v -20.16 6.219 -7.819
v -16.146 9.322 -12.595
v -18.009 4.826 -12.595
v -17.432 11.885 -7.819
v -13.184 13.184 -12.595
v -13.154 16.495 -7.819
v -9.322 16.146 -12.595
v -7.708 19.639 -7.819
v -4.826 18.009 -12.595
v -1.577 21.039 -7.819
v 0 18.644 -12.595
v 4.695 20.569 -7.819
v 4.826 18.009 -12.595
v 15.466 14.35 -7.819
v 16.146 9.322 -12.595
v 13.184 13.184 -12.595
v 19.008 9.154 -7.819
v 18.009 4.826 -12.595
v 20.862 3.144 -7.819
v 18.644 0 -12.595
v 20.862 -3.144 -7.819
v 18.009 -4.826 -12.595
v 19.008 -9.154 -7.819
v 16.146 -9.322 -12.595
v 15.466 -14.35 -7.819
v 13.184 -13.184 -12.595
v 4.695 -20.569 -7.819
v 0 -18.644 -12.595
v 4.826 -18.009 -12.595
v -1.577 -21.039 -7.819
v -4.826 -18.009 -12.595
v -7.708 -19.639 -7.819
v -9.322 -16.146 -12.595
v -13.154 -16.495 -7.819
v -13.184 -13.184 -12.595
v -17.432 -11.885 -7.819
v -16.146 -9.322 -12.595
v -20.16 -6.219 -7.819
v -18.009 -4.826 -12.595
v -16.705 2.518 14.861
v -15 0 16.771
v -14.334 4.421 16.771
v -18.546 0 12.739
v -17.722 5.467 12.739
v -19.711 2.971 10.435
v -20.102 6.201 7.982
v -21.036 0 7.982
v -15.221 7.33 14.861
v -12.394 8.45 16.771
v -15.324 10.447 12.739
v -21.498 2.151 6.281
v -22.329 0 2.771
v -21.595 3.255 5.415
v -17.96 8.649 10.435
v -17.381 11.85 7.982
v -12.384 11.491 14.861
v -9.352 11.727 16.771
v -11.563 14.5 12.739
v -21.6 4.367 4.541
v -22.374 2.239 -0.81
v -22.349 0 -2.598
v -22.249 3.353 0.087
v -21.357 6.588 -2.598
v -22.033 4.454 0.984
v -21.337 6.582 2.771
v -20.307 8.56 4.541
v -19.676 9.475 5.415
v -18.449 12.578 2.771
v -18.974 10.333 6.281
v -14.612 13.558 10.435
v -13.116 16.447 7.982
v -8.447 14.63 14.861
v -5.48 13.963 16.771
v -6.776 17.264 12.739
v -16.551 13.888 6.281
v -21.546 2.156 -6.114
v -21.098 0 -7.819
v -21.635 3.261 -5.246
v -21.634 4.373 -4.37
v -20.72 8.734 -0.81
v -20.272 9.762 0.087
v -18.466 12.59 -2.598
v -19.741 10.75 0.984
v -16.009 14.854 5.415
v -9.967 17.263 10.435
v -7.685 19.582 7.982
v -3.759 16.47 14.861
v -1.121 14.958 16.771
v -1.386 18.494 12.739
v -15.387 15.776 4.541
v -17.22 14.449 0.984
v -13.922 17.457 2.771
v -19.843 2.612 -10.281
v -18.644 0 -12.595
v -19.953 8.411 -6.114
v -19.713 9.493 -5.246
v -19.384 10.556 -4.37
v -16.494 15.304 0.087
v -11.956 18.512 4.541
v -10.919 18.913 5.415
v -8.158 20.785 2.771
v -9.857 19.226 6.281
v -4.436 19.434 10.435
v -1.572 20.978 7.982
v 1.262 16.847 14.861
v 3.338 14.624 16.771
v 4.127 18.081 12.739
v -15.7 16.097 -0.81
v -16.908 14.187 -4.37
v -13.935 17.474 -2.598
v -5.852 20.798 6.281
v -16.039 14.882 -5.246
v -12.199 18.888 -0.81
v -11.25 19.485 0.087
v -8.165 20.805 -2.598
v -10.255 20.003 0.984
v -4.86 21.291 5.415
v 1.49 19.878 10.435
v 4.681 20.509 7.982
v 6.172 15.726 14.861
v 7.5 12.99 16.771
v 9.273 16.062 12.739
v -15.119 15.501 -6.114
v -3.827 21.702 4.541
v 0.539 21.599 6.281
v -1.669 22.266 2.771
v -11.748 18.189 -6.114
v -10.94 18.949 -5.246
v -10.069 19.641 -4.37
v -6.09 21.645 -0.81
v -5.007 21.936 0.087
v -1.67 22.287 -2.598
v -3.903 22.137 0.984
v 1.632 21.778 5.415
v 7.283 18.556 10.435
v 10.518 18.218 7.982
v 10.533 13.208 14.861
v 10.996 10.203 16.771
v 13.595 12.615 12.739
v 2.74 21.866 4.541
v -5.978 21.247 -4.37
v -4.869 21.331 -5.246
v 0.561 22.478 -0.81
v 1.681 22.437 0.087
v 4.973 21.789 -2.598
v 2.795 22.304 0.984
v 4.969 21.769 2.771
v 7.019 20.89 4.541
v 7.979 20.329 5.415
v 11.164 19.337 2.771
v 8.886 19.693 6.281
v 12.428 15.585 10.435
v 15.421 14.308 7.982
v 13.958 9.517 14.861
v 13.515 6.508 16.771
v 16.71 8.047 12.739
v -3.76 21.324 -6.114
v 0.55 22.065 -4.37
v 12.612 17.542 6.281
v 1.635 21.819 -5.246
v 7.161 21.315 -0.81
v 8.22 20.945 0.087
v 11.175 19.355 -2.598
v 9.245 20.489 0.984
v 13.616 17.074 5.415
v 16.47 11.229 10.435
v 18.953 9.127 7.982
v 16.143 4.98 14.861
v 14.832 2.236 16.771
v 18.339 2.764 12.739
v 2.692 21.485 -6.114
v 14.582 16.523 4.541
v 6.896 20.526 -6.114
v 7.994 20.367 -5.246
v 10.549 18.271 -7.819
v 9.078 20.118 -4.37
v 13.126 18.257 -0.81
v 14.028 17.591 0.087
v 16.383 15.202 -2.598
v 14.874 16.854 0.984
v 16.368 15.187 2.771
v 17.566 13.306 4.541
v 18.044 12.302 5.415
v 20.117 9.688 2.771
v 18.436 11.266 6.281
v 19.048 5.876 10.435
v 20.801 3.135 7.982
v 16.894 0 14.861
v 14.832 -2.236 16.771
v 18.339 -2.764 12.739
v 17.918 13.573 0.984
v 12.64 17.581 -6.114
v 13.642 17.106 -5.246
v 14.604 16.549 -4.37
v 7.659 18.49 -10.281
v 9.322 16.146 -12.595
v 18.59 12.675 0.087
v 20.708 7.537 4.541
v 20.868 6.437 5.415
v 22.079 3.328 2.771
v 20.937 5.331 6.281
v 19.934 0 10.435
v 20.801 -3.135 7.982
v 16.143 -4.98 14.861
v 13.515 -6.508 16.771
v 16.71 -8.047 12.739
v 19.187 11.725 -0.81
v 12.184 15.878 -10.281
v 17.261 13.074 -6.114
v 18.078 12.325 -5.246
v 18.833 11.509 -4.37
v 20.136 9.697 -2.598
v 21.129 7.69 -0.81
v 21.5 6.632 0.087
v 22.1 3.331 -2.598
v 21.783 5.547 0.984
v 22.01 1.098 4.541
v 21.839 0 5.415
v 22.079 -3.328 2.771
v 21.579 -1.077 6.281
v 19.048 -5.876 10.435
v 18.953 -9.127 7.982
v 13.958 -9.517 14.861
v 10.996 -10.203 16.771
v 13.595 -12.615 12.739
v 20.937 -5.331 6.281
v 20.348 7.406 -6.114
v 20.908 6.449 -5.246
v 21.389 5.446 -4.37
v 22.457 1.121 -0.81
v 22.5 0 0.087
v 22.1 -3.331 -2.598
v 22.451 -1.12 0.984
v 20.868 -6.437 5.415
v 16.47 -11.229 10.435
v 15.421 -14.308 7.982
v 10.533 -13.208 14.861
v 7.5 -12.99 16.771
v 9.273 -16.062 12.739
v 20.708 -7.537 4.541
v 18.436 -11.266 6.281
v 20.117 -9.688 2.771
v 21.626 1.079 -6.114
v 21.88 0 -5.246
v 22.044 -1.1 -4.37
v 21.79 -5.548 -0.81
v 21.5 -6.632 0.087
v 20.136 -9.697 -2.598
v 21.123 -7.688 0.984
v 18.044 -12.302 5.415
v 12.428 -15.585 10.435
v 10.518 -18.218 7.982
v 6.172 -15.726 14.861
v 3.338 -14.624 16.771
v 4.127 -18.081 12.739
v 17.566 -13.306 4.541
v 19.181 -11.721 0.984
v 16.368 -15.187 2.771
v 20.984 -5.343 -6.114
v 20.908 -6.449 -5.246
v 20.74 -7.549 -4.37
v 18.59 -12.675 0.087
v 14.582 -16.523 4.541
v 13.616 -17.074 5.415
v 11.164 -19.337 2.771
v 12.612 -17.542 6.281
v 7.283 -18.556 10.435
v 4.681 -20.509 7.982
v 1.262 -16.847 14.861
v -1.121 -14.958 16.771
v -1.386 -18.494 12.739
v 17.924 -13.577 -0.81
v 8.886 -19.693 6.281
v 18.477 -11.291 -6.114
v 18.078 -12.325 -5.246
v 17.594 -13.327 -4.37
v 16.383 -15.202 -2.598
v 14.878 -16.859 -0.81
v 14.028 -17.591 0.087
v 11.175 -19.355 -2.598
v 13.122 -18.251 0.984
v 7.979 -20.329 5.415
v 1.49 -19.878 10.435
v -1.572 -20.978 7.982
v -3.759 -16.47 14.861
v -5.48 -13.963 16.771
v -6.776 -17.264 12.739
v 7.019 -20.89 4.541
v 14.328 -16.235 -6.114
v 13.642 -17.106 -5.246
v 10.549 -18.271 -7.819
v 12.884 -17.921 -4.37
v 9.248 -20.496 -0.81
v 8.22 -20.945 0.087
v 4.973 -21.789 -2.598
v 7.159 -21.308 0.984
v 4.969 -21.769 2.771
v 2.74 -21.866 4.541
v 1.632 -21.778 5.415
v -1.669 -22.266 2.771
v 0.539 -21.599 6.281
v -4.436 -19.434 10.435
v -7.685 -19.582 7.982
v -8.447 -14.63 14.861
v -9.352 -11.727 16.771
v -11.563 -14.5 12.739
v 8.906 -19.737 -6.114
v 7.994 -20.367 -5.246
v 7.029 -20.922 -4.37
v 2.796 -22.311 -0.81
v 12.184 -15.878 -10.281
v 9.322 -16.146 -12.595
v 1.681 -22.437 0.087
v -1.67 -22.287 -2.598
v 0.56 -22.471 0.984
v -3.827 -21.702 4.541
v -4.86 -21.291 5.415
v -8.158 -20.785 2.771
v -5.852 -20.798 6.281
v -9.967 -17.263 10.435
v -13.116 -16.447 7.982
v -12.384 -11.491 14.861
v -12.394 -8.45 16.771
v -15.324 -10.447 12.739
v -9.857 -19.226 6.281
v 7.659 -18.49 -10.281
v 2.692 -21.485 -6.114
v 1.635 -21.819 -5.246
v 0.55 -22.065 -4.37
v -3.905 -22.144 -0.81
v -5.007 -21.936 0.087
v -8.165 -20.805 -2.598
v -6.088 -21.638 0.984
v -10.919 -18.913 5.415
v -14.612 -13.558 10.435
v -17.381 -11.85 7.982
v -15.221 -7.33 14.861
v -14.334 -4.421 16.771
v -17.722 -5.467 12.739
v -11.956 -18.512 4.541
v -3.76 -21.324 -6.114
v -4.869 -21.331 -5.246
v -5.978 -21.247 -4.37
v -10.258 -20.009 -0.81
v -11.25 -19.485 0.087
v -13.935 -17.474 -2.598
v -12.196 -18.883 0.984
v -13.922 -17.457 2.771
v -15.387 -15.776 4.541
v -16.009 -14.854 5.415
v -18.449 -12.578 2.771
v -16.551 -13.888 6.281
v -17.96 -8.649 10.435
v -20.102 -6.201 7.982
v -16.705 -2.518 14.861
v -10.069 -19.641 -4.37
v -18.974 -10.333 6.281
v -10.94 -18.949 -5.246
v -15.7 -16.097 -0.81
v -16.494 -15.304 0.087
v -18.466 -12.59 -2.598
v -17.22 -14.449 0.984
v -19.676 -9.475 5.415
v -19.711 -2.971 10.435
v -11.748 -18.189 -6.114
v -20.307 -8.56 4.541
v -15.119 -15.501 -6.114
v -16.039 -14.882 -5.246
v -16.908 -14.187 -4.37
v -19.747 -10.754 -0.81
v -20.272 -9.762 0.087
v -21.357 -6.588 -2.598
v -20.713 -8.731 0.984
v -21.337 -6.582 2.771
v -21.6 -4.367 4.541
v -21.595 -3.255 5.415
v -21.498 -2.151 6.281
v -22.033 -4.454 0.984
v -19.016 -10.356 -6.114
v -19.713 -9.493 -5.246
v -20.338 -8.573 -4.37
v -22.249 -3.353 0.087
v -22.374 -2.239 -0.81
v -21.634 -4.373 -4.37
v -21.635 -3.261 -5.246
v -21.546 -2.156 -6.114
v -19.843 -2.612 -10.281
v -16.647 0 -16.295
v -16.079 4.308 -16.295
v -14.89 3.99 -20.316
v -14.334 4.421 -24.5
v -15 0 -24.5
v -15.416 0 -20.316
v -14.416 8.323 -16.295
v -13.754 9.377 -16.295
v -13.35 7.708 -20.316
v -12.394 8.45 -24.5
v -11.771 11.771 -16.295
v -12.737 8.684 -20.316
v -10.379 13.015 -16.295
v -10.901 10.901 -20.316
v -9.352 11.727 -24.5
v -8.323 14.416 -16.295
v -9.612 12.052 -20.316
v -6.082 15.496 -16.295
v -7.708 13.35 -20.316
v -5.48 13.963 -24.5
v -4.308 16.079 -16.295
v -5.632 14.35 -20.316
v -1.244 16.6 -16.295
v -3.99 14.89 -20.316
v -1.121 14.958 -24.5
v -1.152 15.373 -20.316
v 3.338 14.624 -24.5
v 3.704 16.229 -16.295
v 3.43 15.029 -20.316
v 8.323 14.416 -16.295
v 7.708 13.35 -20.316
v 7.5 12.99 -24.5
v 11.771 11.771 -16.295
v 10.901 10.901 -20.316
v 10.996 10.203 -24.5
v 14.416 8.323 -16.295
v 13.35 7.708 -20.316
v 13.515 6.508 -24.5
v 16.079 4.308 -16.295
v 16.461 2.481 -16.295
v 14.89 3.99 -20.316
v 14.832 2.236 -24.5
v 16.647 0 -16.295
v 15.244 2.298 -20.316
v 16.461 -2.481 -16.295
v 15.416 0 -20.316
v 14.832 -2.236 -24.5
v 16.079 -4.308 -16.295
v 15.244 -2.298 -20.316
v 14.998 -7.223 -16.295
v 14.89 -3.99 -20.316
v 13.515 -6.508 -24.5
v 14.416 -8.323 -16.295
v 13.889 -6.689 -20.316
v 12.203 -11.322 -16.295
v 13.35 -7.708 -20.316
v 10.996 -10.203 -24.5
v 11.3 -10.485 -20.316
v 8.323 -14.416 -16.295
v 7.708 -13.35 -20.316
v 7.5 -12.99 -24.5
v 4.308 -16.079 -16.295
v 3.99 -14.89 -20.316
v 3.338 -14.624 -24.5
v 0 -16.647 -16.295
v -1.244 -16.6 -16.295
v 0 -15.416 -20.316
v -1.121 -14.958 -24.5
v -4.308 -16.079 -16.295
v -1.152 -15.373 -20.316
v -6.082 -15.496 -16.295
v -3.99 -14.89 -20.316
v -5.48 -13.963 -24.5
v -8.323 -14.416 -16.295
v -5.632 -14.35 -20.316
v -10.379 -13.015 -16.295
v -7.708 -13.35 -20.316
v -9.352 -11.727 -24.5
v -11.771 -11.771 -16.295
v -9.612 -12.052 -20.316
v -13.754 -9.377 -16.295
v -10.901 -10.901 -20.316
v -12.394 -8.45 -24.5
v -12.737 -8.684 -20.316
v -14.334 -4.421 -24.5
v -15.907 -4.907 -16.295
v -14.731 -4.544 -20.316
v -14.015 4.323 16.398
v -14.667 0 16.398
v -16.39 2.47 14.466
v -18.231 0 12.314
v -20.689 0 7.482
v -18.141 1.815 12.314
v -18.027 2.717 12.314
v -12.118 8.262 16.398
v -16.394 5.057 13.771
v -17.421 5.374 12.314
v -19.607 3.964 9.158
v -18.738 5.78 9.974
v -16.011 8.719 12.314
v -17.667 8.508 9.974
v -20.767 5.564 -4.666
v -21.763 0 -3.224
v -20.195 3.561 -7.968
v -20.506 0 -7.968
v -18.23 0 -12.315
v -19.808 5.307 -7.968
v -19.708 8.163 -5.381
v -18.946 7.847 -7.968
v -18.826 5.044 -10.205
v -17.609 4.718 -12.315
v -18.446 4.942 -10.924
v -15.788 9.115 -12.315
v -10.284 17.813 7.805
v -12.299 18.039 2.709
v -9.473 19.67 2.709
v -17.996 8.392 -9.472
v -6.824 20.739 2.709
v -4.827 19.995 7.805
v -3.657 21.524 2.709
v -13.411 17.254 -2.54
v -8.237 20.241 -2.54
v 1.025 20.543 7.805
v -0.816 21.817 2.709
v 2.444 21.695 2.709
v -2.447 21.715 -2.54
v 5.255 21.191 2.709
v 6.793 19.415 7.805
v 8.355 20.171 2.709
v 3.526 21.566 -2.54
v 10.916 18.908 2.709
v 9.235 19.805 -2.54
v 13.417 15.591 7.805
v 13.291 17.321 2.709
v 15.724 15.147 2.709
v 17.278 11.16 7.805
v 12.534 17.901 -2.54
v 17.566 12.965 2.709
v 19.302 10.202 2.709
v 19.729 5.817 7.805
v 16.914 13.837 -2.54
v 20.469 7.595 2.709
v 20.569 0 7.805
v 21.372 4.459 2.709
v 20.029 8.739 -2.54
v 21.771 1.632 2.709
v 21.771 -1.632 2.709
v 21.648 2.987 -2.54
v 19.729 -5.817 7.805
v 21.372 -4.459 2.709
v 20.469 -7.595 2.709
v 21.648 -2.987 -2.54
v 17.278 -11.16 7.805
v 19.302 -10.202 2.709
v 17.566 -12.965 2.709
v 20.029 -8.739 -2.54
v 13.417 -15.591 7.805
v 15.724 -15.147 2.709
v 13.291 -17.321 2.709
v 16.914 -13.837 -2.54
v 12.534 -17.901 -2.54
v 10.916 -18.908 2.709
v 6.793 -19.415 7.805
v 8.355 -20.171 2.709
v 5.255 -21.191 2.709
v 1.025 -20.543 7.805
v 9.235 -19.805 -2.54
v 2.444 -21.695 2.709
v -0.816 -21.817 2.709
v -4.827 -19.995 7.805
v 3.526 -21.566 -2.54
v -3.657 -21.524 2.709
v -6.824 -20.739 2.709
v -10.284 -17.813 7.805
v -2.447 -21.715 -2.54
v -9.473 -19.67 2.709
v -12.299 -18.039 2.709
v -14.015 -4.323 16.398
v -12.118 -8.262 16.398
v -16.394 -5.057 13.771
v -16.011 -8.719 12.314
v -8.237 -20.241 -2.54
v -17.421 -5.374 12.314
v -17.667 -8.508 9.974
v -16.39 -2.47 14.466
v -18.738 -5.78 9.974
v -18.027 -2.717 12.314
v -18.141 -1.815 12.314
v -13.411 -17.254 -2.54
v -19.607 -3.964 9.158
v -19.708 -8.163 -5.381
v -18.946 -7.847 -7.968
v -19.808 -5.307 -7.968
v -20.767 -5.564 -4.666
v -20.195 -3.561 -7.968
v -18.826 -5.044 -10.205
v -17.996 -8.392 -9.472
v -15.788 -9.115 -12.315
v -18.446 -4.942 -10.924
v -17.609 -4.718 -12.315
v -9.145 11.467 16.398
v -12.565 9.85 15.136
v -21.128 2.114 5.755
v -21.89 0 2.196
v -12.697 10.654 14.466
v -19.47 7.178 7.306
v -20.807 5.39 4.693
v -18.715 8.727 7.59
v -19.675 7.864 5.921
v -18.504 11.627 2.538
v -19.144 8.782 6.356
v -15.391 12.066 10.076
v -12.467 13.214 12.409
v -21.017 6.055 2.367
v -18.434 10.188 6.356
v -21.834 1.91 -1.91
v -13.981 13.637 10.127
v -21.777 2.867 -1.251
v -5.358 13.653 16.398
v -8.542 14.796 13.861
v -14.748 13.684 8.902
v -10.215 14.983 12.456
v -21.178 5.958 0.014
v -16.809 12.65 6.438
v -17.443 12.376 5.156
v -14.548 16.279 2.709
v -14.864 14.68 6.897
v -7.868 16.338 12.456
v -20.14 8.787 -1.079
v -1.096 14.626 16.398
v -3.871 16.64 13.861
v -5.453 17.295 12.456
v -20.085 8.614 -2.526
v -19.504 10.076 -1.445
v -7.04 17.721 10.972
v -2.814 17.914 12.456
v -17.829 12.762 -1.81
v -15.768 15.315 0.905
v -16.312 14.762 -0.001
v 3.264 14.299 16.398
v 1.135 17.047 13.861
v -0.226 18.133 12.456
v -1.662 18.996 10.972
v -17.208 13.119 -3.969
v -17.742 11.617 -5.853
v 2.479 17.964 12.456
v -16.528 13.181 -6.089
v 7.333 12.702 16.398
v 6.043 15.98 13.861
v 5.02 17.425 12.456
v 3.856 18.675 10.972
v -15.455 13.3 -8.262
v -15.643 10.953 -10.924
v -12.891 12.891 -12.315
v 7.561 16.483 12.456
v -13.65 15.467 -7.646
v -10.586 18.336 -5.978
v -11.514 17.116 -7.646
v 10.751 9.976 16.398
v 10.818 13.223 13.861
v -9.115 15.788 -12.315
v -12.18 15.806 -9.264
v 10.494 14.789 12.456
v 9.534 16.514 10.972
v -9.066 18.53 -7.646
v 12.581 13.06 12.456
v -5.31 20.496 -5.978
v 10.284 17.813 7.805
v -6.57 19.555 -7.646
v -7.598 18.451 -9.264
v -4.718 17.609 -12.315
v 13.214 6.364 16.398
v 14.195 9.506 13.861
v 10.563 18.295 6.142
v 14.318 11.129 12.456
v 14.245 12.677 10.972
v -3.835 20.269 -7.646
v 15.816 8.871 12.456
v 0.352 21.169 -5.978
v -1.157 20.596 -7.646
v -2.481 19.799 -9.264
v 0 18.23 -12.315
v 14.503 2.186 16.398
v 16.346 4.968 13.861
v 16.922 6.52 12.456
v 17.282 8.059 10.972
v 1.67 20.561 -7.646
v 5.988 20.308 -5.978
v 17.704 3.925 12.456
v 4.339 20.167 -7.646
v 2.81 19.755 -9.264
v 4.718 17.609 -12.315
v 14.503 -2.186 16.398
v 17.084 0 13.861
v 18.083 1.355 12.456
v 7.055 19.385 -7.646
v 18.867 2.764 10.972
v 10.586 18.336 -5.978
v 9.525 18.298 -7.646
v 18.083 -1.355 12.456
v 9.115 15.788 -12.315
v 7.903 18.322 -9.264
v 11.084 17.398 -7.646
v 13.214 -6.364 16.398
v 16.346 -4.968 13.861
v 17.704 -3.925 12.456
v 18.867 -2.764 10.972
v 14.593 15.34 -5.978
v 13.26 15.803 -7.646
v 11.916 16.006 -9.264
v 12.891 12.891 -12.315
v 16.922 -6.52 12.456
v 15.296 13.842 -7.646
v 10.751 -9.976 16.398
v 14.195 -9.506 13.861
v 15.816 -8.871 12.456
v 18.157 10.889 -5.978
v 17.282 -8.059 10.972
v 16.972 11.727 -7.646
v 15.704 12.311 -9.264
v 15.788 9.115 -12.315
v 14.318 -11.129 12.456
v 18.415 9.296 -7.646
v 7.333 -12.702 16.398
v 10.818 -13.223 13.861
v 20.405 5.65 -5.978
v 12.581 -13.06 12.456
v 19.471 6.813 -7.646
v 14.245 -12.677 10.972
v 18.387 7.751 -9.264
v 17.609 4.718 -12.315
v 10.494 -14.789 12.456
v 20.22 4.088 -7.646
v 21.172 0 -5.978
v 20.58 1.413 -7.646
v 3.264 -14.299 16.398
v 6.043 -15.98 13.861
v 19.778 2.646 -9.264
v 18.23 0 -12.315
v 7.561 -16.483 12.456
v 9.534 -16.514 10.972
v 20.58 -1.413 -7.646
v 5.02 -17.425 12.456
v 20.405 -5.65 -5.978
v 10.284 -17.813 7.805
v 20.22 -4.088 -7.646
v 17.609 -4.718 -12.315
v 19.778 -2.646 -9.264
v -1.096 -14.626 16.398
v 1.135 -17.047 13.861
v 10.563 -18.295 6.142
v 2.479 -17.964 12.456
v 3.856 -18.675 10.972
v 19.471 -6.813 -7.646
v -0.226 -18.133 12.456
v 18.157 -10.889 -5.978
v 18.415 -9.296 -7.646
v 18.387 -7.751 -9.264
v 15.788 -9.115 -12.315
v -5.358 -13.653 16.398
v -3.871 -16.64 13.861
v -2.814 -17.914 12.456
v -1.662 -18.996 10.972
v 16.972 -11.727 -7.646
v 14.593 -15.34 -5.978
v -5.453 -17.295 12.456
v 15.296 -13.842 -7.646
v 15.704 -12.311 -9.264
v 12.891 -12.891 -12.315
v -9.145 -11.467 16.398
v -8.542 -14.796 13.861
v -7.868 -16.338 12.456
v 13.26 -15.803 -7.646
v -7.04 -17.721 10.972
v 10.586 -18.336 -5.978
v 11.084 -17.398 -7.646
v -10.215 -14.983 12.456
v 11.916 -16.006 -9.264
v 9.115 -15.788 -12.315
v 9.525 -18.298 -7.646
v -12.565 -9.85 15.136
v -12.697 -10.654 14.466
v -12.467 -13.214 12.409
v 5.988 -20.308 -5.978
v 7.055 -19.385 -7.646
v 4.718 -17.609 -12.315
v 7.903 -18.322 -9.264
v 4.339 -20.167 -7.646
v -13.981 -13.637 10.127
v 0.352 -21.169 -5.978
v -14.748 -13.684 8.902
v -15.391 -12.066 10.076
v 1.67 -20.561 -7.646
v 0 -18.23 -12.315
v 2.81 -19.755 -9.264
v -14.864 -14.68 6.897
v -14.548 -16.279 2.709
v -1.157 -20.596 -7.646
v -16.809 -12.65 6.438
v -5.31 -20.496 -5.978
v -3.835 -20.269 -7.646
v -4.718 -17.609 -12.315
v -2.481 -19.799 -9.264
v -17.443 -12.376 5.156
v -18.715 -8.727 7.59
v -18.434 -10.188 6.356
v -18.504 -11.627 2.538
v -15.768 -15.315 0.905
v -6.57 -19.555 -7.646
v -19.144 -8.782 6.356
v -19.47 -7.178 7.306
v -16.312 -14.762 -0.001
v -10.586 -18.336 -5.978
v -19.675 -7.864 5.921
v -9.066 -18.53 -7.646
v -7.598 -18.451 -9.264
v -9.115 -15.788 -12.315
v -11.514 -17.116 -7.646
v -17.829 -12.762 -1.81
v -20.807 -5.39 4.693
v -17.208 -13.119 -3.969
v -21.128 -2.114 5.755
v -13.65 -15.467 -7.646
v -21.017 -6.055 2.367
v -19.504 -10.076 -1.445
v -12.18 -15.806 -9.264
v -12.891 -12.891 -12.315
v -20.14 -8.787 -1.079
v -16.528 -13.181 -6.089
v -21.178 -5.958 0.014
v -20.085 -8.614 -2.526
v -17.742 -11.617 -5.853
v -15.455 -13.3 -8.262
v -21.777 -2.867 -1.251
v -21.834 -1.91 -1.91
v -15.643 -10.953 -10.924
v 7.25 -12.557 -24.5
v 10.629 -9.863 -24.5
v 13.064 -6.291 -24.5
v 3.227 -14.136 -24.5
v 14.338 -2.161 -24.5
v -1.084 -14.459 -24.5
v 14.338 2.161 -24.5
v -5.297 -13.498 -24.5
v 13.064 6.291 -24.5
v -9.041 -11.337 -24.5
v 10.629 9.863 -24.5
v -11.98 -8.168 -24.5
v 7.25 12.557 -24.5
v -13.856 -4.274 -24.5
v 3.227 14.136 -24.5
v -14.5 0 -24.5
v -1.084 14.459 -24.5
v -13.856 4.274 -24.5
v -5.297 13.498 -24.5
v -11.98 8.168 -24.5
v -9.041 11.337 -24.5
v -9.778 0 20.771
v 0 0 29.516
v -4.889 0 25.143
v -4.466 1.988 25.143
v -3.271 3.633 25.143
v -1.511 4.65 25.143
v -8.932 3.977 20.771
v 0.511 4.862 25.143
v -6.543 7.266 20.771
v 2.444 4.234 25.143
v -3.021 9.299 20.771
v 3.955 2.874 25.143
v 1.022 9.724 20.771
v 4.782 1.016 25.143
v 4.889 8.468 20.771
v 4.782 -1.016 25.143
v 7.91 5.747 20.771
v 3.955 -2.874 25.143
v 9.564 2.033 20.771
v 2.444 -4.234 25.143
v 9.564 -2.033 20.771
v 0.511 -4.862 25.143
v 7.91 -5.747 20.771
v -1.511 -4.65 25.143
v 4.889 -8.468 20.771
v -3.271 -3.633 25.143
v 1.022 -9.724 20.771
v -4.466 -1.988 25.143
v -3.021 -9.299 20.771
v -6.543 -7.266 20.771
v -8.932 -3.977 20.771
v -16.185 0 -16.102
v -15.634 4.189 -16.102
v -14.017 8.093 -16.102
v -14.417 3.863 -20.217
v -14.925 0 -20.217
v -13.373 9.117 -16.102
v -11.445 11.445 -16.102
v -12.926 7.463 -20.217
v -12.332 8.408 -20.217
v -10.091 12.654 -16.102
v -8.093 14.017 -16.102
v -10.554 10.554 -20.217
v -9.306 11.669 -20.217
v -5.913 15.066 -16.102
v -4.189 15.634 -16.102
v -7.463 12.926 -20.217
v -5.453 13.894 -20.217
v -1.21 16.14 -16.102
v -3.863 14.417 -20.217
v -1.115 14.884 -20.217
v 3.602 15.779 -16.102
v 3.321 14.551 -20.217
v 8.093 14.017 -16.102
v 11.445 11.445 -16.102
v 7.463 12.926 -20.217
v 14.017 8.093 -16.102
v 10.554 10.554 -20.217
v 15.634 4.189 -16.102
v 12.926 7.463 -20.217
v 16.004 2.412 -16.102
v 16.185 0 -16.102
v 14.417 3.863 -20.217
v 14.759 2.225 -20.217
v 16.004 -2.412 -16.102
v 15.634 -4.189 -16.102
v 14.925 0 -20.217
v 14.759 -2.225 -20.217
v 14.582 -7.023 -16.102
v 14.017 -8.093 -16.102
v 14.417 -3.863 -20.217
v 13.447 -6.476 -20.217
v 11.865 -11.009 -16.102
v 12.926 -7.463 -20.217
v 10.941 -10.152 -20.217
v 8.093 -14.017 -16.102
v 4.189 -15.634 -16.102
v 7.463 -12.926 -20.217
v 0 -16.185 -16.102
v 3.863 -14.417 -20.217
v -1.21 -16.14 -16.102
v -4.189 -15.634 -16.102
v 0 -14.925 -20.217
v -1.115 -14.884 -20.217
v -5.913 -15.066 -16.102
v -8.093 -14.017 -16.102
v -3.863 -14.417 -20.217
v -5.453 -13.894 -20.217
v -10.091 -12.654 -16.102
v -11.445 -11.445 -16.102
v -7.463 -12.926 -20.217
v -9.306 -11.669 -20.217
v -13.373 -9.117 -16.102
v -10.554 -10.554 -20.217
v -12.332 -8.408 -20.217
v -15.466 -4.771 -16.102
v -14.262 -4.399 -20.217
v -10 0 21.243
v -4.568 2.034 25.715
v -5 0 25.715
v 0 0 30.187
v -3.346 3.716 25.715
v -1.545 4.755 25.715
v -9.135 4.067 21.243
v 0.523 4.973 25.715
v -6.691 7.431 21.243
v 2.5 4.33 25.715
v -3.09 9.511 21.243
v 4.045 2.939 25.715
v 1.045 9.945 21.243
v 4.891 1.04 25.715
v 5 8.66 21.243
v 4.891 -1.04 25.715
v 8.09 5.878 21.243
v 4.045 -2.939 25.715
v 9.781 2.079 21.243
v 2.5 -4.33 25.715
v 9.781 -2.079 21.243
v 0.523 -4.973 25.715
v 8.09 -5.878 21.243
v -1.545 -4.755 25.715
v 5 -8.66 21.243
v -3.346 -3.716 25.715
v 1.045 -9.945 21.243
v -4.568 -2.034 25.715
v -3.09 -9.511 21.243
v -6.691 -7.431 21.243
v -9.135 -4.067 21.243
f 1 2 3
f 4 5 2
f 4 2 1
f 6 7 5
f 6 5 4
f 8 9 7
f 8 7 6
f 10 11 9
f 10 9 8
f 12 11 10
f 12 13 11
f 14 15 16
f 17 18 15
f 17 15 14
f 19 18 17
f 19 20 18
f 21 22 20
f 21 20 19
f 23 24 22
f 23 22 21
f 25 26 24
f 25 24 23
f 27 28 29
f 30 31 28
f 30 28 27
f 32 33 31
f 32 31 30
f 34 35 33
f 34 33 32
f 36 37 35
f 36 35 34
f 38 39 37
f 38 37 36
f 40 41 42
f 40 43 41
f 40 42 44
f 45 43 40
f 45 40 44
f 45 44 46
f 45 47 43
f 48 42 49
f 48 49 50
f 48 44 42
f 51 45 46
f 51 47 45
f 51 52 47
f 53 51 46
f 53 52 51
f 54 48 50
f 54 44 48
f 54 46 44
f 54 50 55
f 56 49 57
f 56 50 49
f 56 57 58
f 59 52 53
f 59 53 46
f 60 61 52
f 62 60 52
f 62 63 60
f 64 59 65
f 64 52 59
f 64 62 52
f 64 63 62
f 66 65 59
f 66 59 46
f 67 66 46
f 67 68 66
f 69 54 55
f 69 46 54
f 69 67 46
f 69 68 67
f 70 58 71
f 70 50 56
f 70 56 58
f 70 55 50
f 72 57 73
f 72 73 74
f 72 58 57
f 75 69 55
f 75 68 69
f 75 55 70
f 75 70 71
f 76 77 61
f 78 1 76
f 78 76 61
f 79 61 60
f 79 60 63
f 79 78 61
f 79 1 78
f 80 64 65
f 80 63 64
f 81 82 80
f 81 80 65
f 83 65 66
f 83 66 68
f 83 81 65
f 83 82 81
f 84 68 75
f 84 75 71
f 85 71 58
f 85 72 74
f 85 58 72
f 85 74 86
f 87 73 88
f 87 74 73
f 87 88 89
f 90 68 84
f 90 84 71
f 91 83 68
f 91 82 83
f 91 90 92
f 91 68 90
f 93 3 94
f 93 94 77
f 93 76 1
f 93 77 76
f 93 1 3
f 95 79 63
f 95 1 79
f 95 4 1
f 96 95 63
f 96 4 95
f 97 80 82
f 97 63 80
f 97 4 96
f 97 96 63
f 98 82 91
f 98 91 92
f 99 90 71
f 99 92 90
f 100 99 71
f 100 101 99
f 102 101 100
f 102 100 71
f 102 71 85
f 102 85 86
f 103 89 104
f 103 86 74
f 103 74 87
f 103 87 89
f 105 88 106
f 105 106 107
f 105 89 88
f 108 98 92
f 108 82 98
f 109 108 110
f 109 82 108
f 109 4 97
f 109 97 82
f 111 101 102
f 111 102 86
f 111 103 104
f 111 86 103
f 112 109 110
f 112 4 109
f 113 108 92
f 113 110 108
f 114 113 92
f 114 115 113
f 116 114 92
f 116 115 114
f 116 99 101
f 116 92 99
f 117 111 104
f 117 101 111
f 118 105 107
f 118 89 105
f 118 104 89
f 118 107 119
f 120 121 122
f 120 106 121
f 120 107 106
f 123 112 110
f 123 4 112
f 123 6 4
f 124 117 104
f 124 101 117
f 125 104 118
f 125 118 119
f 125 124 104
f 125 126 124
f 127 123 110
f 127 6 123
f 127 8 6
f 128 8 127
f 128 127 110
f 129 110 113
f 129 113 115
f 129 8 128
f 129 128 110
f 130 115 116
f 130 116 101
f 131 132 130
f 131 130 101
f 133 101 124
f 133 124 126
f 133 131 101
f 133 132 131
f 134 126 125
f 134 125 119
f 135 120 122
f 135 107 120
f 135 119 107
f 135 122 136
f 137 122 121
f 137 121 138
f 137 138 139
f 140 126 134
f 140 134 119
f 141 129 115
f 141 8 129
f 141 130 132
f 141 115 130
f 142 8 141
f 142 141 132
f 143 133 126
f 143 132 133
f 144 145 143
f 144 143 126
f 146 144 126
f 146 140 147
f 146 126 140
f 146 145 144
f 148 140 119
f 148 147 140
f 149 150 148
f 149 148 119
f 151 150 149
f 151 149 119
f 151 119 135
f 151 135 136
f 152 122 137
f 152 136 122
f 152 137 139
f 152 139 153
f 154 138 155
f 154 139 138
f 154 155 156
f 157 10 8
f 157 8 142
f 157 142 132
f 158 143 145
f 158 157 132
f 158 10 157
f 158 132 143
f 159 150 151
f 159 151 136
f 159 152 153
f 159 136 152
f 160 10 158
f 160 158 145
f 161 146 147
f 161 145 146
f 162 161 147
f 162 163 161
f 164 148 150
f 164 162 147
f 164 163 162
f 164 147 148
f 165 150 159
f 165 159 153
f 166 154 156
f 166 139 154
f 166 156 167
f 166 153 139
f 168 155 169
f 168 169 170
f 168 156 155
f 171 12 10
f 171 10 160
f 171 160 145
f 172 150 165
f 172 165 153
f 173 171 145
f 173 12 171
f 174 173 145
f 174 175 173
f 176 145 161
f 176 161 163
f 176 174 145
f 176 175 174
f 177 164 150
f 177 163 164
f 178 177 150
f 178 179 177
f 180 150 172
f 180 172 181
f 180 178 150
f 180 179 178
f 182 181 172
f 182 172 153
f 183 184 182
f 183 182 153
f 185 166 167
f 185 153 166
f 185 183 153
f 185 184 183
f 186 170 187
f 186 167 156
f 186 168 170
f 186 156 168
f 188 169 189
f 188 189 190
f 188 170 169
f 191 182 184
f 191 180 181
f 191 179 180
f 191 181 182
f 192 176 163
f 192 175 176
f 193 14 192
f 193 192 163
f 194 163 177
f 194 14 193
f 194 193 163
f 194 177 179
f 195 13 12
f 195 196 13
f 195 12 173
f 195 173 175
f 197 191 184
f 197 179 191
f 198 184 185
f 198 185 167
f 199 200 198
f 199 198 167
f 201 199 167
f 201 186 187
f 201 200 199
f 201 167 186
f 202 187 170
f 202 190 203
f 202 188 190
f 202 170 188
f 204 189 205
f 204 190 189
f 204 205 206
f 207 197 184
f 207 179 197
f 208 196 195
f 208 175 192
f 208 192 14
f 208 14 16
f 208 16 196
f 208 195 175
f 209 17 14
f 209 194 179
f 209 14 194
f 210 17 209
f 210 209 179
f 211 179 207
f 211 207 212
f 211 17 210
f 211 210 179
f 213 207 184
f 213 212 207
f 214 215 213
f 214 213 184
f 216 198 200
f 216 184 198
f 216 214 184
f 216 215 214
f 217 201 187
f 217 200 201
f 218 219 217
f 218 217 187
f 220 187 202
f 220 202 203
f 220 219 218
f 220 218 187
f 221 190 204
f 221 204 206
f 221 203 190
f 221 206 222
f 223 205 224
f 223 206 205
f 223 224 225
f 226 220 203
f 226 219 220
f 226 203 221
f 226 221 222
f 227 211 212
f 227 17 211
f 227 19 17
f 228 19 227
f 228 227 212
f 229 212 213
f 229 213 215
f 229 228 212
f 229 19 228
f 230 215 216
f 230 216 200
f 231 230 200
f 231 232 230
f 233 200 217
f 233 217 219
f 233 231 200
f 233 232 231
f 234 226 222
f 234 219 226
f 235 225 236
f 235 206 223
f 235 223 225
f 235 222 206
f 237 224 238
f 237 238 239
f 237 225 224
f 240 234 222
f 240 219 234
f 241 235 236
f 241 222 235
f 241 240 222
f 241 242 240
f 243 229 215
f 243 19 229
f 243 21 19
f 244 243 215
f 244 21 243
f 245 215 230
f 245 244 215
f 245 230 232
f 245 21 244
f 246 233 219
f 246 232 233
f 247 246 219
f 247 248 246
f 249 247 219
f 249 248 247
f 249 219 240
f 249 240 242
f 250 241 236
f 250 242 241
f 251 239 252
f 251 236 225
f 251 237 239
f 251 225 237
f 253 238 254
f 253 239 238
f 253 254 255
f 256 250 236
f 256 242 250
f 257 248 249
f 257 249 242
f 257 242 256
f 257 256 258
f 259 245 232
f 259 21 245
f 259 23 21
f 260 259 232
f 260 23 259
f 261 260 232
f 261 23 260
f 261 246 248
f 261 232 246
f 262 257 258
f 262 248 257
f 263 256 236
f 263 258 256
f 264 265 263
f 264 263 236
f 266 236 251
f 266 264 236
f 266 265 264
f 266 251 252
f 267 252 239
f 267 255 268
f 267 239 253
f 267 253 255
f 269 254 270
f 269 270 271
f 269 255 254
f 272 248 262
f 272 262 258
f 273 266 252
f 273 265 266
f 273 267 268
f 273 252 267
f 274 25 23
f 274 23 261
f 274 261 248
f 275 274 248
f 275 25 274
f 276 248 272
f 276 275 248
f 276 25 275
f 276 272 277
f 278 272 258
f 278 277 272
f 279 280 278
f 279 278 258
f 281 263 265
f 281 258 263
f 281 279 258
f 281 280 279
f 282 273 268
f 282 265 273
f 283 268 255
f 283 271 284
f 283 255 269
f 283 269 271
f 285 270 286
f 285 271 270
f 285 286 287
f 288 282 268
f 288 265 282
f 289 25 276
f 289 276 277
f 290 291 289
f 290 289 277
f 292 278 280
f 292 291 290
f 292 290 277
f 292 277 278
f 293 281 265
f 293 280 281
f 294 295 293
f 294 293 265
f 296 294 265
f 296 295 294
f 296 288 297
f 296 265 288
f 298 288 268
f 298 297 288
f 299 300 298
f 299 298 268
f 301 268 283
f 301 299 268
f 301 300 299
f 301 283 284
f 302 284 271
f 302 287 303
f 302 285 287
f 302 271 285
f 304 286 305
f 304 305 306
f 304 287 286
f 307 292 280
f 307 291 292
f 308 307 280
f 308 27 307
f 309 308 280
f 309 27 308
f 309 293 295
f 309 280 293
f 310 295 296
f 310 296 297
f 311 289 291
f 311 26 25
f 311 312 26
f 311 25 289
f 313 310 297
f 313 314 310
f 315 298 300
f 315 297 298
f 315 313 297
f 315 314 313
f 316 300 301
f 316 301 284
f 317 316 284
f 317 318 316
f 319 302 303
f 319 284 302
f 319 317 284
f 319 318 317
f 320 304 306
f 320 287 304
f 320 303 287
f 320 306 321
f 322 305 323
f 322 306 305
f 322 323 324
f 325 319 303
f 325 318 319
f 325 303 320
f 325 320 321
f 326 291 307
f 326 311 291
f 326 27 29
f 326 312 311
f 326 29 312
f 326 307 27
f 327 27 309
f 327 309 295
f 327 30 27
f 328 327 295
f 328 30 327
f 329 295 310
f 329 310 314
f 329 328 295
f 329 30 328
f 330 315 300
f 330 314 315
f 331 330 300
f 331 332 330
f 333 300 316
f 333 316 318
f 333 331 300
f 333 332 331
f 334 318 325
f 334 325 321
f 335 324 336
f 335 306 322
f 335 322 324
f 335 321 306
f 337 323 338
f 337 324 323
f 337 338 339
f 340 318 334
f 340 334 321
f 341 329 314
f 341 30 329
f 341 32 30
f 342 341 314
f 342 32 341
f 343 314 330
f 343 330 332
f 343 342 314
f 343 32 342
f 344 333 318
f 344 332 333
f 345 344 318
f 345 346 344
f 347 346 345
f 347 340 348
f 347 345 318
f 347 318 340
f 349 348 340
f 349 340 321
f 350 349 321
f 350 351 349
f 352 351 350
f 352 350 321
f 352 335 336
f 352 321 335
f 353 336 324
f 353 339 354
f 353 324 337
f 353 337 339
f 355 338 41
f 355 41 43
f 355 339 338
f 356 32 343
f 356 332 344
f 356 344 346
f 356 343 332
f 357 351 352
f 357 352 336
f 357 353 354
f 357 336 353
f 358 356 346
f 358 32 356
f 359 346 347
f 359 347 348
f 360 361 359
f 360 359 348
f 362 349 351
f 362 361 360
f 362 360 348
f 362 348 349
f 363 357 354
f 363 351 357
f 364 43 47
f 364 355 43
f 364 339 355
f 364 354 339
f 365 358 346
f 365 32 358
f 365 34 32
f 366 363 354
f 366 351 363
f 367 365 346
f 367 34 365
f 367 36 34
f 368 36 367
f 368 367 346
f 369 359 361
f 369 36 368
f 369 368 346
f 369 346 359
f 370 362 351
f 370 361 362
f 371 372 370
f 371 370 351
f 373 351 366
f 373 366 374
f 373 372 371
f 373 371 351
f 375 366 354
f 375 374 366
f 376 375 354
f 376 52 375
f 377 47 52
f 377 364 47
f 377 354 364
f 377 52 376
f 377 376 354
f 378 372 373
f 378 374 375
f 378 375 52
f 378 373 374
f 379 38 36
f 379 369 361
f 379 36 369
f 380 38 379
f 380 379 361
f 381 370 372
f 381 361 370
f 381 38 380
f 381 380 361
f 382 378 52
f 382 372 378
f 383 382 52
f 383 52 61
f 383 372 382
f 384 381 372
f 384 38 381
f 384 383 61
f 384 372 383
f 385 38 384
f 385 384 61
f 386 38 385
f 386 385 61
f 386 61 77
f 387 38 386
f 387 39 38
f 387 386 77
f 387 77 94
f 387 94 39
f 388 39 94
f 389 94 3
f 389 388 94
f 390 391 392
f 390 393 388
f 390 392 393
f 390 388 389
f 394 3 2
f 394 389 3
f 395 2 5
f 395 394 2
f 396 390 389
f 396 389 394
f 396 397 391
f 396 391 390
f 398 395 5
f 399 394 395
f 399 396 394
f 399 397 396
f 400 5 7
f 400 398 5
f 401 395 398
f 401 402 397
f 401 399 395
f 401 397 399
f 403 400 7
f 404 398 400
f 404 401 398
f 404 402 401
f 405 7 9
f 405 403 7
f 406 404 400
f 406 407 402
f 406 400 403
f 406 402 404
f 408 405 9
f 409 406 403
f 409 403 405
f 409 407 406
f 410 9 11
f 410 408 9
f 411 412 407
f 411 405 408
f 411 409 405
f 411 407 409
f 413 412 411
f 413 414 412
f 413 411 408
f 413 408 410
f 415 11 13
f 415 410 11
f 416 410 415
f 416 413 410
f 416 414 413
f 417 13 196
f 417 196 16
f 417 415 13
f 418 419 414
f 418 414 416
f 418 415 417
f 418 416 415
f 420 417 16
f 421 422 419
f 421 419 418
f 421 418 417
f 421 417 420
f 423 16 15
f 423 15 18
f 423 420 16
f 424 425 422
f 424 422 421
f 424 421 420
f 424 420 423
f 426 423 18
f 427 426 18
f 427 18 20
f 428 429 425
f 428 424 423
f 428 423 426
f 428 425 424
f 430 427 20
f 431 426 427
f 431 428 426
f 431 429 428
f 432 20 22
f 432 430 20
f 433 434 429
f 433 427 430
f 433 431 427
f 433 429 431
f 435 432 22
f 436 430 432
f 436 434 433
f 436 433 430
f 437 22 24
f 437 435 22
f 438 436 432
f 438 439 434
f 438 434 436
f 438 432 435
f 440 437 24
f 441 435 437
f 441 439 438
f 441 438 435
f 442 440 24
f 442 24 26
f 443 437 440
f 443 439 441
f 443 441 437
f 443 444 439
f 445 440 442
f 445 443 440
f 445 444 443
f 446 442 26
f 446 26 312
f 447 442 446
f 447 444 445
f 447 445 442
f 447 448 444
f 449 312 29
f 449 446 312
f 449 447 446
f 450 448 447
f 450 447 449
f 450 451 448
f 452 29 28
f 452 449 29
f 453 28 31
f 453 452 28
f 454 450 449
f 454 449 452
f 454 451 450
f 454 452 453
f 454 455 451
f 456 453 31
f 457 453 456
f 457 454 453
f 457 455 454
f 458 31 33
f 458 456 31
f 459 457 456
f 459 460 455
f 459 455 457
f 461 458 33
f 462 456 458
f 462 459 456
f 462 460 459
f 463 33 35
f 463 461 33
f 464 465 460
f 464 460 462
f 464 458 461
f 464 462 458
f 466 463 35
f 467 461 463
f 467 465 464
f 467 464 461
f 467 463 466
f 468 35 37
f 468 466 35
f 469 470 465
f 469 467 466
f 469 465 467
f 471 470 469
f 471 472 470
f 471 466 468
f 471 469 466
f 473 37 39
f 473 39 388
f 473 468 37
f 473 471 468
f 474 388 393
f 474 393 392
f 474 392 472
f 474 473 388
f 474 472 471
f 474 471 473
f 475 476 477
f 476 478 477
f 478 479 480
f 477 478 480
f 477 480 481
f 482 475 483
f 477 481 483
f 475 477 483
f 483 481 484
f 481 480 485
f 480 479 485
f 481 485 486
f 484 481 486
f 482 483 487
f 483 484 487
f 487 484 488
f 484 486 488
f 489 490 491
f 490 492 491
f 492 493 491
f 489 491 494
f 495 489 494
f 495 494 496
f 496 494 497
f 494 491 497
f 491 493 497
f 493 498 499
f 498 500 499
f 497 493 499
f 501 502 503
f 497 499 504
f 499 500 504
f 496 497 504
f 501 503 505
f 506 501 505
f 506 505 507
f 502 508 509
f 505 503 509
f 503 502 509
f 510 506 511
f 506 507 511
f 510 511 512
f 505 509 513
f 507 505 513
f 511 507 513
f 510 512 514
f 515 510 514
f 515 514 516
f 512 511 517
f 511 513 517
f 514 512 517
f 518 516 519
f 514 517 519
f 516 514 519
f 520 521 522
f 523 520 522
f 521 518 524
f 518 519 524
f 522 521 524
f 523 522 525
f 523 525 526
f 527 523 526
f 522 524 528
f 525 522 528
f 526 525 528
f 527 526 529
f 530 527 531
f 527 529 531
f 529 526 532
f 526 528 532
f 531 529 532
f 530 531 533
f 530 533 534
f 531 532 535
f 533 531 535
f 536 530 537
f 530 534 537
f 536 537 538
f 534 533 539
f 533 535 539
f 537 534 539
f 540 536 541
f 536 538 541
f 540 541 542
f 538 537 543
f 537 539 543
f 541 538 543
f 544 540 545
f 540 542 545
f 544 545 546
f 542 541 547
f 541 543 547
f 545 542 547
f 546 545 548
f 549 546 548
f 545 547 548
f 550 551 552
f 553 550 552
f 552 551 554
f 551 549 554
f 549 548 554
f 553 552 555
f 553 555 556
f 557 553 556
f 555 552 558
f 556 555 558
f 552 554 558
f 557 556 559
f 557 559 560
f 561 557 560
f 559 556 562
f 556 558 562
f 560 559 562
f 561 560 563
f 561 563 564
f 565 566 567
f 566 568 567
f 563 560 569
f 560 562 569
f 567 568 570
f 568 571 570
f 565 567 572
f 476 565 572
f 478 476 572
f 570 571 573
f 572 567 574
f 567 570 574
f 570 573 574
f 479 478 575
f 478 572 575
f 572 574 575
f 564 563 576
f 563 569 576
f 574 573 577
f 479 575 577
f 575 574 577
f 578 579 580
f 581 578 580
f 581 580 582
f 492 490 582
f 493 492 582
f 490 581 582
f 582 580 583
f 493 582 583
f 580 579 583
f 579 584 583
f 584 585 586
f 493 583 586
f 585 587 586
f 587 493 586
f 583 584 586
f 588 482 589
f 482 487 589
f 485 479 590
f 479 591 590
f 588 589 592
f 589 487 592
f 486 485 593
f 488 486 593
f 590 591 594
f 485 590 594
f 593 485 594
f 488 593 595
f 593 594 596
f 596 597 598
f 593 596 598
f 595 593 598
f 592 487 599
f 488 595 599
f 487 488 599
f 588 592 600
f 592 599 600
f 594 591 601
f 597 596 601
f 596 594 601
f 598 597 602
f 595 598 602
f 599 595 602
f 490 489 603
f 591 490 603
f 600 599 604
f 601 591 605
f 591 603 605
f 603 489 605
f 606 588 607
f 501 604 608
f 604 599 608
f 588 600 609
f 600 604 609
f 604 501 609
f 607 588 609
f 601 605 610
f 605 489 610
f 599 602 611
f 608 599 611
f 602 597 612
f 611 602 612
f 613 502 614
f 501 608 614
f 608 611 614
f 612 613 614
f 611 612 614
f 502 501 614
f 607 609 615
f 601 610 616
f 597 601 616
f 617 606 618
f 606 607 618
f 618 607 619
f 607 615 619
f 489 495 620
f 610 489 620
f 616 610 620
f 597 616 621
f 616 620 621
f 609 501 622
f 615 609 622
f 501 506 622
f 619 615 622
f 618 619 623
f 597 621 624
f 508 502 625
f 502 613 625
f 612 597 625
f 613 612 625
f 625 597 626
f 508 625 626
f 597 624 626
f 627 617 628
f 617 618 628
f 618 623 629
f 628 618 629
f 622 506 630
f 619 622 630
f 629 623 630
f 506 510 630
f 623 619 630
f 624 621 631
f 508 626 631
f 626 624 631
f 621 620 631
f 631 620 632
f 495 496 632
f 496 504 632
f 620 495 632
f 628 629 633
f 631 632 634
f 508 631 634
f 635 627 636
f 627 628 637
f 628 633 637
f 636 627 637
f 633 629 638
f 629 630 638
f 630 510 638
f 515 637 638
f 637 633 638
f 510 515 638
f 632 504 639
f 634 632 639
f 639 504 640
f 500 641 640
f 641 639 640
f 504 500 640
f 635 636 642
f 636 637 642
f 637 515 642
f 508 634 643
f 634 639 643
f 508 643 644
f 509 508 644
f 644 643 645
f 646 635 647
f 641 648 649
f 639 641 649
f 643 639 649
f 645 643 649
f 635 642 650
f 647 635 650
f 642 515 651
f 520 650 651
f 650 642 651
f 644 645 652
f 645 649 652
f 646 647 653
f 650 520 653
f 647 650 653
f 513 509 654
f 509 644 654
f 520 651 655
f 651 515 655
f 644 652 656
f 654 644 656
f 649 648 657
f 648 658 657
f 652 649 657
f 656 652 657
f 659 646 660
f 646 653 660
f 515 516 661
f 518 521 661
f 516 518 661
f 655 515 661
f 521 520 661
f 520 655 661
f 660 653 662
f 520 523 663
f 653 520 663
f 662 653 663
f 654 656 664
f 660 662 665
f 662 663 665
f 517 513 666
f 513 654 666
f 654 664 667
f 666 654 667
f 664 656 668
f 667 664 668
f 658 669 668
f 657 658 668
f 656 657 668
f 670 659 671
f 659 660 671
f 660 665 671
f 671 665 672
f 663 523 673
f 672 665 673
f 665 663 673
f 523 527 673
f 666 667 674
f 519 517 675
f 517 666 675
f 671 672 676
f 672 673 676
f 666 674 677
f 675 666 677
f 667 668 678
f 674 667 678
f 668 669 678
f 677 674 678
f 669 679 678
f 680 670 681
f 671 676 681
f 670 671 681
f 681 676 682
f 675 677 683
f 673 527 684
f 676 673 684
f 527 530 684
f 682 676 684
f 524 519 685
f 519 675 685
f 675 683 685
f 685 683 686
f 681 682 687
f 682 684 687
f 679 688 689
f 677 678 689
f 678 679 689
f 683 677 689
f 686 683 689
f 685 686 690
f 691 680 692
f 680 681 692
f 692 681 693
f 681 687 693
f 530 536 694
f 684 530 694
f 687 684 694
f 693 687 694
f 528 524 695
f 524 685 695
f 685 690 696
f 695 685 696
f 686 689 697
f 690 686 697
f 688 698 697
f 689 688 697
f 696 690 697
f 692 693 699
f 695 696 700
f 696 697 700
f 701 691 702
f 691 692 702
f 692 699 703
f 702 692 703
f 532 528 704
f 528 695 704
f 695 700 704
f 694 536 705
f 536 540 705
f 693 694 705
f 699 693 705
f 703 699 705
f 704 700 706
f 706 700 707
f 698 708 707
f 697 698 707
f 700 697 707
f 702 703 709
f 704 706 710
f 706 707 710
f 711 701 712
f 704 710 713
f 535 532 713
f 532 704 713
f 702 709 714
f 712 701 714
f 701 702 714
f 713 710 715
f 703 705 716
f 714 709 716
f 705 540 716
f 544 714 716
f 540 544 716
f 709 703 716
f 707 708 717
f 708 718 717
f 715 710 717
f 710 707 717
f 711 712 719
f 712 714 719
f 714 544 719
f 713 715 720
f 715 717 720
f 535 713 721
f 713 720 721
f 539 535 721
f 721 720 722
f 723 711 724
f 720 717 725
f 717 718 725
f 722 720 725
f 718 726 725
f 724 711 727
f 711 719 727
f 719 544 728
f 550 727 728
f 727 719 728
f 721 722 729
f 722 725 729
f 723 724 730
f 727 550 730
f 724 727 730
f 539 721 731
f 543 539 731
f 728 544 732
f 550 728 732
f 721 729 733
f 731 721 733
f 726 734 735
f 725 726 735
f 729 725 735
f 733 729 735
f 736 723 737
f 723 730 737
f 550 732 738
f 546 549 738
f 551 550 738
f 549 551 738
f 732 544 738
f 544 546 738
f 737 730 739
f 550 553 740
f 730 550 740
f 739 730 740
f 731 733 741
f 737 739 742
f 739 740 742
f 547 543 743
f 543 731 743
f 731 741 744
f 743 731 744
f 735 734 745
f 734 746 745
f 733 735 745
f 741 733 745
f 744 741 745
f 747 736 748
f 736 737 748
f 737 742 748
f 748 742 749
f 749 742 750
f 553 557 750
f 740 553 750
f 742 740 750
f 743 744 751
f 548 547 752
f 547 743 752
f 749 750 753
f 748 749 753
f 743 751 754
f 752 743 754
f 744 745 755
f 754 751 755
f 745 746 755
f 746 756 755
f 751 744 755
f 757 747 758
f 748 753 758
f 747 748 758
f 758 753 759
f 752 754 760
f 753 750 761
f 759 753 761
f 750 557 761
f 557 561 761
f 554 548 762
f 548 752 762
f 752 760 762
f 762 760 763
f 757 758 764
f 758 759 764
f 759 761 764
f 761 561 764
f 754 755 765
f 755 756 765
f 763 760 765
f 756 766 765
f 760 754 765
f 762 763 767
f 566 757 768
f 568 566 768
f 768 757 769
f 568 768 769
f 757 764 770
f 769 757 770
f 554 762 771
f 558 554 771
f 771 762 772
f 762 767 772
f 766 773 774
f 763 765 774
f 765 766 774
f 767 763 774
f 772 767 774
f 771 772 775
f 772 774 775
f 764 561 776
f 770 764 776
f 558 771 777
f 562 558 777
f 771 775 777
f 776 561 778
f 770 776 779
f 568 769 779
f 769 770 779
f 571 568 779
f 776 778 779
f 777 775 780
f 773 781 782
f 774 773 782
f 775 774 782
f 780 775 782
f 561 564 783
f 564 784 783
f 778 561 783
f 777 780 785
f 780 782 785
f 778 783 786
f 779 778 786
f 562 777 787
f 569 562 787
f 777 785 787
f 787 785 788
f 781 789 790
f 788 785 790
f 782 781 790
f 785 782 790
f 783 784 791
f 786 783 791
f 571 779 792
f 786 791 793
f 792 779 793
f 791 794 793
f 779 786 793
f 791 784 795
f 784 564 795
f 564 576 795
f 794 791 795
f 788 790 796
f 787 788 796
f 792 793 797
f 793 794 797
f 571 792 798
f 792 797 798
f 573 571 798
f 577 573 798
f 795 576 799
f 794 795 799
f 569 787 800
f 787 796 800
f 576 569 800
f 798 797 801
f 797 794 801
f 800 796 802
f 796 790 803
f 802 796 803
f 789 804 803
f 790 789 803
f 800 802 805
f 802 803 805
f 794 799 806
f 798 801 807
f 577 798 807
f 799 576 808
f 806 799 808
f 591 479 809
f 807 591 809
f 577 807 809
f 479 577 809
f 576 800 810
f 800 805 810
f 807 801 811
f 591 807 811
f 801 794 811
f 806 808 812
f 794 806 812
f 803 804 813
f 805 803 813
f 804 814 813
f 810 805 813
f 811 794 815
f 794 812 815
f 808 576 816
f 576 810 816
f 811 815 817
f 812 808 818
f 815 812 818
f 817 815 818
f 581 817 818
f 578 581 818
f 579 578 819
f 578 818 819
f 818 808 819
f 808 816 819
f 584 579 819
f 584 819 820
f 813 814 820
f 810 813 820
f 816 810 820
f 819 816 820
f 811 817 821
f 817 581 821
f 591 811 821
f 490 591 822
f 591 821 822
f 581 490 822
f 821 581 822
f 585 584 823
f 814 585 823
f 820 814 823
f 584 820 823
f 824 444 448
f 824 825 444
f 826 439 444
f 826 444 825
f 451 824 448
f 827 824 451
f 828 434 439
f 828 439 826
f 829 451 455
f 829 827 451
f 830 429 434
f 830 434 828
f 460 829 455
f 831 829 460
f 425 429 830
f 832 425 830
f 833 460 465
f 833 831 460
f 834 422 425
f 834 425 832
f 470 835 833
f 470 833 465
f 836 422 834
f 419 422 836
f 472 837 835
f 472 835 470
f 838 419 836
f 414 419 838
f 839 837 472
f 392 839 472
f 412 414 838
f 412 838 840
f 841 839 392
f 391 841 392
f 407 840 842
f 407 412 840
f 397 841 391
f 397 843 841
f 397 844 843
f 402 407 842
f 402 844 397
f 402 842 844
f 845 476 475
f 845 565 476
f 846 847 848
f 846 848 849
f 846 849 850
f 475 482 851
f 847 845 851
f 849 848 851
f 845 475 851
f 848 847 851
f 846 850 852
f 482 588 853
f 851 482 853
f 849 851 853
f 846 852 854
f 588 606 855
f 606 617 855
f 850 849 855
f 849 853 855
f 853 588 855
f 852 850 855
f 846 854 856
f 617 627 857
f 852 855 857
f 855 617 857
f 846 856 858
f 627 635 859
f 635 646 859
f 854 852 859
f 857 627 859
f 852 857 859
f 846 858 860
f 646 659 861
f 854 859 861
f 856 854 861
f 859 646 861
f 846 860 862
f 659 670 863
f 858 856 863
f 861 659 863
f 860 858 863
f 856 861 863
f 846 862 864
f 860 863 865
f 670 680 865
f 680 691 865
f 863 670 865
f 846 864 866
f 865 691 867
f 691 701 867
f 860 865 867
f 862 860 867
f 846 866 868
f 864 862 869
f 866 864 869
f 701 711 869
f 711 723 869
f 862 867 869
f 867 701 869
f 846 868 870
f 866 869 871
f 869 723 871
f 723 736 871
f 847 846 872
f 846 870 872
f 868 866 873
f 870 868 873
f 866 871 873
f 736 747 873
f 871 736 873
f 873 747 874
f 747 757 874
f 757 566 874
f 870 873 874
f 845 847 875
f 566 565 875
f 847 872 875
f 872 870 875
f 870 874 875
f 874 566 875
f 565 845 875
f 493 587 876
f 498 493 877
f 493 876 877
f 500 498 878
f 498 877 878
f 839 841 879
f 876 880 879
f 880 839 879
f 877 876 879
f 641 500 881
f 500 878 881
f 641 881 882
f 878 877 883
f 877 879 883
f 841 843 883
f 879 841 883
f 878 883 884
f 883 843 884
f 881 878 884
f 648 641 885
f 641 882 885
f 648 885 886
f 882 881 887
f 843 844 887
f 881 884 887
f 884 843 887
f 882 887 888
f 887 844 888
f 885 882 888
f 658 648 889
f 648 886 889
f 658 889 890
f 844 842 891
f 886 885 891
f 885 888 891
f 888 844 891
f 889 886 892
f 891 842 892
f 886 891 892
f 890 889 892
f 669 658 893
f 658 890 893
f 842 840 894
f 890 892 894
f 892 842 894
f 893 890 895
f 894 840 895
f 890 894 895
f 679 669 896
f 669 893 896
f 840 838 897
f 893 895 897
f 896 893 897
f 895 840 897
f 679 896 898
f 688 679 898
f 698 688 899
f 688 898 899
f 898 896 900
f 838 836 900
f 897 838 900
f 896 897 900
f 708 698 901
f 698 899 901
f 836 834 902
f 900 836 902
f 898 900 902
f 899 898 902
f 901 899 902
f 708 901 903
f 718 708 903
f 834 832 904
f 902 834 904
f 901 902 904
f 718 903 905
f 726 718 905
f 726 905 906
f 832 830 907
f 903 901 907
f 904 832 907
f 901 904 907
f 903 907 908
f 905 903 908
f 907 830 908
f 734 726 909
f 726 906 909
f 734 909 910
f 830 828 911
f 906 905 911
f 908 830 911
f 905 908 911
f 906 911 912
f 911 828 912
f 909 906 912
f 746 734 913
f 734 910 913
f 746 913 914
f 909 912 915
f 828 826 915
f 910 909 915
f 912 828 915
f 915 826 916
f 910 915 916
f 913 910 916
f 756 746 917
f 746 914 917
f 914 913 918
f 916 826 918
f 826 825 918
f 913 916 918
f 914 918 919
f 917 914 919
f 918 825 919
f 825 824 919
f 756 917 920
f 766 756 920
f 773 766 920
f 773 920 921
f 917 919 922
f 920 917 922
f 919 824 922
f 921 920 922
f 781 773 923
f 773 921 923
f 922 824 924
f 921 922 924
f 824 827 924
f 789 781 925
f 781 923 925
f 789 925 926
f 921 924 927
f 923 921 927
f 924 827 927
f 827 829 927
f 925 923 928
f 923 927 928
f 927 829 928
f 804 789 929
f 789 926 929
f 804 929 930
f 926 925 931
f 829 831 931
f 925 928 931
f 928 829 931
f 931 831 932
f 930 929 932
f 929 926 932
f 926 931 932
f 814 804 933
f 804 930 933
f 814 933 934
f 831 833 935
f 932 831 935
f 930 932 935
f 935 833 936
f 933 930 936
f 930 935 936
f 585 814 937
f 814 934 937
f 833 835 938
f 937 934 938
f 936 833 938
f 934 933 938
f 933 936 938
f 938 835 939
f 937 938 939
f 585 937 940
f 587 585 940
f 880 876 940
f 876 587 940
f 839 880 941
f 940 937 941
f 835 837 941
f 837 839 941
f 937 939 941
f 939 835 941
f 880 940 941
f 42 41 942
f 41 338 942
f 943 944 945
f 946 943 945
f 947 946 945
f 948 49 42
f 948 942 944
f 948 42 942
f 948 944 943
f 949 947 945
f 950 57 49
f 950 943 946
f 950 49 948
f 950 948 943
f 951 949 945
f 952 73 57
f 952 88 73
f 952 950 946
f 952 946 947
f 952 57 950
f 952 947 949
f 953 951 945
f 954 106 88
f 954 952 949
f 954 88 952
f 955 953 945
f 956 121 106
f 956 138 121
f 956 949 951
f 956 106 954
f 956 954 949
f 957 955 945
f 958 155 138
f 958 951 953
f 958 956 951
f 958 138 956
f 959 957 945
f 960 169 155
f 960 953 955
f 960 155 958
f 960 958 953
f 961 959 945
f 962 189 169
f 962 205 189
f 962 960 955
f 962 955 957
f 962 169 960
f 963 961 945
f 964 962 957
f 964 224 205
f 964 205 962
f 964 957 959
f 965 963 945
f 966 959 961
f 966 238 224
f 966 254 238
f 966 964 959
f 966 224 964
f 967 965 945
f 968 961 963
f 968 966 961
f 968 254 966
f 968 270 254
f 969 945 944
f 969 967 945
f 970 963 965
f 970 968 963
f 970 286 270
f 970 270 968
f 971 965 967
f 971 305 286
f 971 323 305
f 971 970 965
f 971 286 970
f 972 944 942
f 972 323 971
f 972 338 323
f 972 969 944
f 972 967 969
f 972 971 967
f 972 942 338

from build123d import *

# Parameters (mm, degrees)
F2_T = -0.5


with BuildPart() as f1:
    # F0 (on Front) → F1 (revolve)
    with BuildSketch(Plane.XZ):
        with BuildLine():
            Line((0, 30.186918), (-15, 16.77051))
            ThreePointArc((-15, 16.77051), (-22.328713, 2.771025), (-18.644326, -12.595202))
            ThreePointArc((-18.644326, -12.595202), (-15.931481, -18.274943), (-15, -24.5))
            Line((-15, -24.5), (0, -24.5))
            Line((0, -24.5), (0, 30.186918))
        make_face()
    revolve(axis=Axis((0, 0, -14.42638), (0, 0, -1)))

    # F2
    f2_openings = [f1.faces().sort_by_distance(p)[0] for p in [
        (0, 0, -24.5),
    ]]
    offset(amount=F2_T, openings=f2_openings)


solid = f1.part
